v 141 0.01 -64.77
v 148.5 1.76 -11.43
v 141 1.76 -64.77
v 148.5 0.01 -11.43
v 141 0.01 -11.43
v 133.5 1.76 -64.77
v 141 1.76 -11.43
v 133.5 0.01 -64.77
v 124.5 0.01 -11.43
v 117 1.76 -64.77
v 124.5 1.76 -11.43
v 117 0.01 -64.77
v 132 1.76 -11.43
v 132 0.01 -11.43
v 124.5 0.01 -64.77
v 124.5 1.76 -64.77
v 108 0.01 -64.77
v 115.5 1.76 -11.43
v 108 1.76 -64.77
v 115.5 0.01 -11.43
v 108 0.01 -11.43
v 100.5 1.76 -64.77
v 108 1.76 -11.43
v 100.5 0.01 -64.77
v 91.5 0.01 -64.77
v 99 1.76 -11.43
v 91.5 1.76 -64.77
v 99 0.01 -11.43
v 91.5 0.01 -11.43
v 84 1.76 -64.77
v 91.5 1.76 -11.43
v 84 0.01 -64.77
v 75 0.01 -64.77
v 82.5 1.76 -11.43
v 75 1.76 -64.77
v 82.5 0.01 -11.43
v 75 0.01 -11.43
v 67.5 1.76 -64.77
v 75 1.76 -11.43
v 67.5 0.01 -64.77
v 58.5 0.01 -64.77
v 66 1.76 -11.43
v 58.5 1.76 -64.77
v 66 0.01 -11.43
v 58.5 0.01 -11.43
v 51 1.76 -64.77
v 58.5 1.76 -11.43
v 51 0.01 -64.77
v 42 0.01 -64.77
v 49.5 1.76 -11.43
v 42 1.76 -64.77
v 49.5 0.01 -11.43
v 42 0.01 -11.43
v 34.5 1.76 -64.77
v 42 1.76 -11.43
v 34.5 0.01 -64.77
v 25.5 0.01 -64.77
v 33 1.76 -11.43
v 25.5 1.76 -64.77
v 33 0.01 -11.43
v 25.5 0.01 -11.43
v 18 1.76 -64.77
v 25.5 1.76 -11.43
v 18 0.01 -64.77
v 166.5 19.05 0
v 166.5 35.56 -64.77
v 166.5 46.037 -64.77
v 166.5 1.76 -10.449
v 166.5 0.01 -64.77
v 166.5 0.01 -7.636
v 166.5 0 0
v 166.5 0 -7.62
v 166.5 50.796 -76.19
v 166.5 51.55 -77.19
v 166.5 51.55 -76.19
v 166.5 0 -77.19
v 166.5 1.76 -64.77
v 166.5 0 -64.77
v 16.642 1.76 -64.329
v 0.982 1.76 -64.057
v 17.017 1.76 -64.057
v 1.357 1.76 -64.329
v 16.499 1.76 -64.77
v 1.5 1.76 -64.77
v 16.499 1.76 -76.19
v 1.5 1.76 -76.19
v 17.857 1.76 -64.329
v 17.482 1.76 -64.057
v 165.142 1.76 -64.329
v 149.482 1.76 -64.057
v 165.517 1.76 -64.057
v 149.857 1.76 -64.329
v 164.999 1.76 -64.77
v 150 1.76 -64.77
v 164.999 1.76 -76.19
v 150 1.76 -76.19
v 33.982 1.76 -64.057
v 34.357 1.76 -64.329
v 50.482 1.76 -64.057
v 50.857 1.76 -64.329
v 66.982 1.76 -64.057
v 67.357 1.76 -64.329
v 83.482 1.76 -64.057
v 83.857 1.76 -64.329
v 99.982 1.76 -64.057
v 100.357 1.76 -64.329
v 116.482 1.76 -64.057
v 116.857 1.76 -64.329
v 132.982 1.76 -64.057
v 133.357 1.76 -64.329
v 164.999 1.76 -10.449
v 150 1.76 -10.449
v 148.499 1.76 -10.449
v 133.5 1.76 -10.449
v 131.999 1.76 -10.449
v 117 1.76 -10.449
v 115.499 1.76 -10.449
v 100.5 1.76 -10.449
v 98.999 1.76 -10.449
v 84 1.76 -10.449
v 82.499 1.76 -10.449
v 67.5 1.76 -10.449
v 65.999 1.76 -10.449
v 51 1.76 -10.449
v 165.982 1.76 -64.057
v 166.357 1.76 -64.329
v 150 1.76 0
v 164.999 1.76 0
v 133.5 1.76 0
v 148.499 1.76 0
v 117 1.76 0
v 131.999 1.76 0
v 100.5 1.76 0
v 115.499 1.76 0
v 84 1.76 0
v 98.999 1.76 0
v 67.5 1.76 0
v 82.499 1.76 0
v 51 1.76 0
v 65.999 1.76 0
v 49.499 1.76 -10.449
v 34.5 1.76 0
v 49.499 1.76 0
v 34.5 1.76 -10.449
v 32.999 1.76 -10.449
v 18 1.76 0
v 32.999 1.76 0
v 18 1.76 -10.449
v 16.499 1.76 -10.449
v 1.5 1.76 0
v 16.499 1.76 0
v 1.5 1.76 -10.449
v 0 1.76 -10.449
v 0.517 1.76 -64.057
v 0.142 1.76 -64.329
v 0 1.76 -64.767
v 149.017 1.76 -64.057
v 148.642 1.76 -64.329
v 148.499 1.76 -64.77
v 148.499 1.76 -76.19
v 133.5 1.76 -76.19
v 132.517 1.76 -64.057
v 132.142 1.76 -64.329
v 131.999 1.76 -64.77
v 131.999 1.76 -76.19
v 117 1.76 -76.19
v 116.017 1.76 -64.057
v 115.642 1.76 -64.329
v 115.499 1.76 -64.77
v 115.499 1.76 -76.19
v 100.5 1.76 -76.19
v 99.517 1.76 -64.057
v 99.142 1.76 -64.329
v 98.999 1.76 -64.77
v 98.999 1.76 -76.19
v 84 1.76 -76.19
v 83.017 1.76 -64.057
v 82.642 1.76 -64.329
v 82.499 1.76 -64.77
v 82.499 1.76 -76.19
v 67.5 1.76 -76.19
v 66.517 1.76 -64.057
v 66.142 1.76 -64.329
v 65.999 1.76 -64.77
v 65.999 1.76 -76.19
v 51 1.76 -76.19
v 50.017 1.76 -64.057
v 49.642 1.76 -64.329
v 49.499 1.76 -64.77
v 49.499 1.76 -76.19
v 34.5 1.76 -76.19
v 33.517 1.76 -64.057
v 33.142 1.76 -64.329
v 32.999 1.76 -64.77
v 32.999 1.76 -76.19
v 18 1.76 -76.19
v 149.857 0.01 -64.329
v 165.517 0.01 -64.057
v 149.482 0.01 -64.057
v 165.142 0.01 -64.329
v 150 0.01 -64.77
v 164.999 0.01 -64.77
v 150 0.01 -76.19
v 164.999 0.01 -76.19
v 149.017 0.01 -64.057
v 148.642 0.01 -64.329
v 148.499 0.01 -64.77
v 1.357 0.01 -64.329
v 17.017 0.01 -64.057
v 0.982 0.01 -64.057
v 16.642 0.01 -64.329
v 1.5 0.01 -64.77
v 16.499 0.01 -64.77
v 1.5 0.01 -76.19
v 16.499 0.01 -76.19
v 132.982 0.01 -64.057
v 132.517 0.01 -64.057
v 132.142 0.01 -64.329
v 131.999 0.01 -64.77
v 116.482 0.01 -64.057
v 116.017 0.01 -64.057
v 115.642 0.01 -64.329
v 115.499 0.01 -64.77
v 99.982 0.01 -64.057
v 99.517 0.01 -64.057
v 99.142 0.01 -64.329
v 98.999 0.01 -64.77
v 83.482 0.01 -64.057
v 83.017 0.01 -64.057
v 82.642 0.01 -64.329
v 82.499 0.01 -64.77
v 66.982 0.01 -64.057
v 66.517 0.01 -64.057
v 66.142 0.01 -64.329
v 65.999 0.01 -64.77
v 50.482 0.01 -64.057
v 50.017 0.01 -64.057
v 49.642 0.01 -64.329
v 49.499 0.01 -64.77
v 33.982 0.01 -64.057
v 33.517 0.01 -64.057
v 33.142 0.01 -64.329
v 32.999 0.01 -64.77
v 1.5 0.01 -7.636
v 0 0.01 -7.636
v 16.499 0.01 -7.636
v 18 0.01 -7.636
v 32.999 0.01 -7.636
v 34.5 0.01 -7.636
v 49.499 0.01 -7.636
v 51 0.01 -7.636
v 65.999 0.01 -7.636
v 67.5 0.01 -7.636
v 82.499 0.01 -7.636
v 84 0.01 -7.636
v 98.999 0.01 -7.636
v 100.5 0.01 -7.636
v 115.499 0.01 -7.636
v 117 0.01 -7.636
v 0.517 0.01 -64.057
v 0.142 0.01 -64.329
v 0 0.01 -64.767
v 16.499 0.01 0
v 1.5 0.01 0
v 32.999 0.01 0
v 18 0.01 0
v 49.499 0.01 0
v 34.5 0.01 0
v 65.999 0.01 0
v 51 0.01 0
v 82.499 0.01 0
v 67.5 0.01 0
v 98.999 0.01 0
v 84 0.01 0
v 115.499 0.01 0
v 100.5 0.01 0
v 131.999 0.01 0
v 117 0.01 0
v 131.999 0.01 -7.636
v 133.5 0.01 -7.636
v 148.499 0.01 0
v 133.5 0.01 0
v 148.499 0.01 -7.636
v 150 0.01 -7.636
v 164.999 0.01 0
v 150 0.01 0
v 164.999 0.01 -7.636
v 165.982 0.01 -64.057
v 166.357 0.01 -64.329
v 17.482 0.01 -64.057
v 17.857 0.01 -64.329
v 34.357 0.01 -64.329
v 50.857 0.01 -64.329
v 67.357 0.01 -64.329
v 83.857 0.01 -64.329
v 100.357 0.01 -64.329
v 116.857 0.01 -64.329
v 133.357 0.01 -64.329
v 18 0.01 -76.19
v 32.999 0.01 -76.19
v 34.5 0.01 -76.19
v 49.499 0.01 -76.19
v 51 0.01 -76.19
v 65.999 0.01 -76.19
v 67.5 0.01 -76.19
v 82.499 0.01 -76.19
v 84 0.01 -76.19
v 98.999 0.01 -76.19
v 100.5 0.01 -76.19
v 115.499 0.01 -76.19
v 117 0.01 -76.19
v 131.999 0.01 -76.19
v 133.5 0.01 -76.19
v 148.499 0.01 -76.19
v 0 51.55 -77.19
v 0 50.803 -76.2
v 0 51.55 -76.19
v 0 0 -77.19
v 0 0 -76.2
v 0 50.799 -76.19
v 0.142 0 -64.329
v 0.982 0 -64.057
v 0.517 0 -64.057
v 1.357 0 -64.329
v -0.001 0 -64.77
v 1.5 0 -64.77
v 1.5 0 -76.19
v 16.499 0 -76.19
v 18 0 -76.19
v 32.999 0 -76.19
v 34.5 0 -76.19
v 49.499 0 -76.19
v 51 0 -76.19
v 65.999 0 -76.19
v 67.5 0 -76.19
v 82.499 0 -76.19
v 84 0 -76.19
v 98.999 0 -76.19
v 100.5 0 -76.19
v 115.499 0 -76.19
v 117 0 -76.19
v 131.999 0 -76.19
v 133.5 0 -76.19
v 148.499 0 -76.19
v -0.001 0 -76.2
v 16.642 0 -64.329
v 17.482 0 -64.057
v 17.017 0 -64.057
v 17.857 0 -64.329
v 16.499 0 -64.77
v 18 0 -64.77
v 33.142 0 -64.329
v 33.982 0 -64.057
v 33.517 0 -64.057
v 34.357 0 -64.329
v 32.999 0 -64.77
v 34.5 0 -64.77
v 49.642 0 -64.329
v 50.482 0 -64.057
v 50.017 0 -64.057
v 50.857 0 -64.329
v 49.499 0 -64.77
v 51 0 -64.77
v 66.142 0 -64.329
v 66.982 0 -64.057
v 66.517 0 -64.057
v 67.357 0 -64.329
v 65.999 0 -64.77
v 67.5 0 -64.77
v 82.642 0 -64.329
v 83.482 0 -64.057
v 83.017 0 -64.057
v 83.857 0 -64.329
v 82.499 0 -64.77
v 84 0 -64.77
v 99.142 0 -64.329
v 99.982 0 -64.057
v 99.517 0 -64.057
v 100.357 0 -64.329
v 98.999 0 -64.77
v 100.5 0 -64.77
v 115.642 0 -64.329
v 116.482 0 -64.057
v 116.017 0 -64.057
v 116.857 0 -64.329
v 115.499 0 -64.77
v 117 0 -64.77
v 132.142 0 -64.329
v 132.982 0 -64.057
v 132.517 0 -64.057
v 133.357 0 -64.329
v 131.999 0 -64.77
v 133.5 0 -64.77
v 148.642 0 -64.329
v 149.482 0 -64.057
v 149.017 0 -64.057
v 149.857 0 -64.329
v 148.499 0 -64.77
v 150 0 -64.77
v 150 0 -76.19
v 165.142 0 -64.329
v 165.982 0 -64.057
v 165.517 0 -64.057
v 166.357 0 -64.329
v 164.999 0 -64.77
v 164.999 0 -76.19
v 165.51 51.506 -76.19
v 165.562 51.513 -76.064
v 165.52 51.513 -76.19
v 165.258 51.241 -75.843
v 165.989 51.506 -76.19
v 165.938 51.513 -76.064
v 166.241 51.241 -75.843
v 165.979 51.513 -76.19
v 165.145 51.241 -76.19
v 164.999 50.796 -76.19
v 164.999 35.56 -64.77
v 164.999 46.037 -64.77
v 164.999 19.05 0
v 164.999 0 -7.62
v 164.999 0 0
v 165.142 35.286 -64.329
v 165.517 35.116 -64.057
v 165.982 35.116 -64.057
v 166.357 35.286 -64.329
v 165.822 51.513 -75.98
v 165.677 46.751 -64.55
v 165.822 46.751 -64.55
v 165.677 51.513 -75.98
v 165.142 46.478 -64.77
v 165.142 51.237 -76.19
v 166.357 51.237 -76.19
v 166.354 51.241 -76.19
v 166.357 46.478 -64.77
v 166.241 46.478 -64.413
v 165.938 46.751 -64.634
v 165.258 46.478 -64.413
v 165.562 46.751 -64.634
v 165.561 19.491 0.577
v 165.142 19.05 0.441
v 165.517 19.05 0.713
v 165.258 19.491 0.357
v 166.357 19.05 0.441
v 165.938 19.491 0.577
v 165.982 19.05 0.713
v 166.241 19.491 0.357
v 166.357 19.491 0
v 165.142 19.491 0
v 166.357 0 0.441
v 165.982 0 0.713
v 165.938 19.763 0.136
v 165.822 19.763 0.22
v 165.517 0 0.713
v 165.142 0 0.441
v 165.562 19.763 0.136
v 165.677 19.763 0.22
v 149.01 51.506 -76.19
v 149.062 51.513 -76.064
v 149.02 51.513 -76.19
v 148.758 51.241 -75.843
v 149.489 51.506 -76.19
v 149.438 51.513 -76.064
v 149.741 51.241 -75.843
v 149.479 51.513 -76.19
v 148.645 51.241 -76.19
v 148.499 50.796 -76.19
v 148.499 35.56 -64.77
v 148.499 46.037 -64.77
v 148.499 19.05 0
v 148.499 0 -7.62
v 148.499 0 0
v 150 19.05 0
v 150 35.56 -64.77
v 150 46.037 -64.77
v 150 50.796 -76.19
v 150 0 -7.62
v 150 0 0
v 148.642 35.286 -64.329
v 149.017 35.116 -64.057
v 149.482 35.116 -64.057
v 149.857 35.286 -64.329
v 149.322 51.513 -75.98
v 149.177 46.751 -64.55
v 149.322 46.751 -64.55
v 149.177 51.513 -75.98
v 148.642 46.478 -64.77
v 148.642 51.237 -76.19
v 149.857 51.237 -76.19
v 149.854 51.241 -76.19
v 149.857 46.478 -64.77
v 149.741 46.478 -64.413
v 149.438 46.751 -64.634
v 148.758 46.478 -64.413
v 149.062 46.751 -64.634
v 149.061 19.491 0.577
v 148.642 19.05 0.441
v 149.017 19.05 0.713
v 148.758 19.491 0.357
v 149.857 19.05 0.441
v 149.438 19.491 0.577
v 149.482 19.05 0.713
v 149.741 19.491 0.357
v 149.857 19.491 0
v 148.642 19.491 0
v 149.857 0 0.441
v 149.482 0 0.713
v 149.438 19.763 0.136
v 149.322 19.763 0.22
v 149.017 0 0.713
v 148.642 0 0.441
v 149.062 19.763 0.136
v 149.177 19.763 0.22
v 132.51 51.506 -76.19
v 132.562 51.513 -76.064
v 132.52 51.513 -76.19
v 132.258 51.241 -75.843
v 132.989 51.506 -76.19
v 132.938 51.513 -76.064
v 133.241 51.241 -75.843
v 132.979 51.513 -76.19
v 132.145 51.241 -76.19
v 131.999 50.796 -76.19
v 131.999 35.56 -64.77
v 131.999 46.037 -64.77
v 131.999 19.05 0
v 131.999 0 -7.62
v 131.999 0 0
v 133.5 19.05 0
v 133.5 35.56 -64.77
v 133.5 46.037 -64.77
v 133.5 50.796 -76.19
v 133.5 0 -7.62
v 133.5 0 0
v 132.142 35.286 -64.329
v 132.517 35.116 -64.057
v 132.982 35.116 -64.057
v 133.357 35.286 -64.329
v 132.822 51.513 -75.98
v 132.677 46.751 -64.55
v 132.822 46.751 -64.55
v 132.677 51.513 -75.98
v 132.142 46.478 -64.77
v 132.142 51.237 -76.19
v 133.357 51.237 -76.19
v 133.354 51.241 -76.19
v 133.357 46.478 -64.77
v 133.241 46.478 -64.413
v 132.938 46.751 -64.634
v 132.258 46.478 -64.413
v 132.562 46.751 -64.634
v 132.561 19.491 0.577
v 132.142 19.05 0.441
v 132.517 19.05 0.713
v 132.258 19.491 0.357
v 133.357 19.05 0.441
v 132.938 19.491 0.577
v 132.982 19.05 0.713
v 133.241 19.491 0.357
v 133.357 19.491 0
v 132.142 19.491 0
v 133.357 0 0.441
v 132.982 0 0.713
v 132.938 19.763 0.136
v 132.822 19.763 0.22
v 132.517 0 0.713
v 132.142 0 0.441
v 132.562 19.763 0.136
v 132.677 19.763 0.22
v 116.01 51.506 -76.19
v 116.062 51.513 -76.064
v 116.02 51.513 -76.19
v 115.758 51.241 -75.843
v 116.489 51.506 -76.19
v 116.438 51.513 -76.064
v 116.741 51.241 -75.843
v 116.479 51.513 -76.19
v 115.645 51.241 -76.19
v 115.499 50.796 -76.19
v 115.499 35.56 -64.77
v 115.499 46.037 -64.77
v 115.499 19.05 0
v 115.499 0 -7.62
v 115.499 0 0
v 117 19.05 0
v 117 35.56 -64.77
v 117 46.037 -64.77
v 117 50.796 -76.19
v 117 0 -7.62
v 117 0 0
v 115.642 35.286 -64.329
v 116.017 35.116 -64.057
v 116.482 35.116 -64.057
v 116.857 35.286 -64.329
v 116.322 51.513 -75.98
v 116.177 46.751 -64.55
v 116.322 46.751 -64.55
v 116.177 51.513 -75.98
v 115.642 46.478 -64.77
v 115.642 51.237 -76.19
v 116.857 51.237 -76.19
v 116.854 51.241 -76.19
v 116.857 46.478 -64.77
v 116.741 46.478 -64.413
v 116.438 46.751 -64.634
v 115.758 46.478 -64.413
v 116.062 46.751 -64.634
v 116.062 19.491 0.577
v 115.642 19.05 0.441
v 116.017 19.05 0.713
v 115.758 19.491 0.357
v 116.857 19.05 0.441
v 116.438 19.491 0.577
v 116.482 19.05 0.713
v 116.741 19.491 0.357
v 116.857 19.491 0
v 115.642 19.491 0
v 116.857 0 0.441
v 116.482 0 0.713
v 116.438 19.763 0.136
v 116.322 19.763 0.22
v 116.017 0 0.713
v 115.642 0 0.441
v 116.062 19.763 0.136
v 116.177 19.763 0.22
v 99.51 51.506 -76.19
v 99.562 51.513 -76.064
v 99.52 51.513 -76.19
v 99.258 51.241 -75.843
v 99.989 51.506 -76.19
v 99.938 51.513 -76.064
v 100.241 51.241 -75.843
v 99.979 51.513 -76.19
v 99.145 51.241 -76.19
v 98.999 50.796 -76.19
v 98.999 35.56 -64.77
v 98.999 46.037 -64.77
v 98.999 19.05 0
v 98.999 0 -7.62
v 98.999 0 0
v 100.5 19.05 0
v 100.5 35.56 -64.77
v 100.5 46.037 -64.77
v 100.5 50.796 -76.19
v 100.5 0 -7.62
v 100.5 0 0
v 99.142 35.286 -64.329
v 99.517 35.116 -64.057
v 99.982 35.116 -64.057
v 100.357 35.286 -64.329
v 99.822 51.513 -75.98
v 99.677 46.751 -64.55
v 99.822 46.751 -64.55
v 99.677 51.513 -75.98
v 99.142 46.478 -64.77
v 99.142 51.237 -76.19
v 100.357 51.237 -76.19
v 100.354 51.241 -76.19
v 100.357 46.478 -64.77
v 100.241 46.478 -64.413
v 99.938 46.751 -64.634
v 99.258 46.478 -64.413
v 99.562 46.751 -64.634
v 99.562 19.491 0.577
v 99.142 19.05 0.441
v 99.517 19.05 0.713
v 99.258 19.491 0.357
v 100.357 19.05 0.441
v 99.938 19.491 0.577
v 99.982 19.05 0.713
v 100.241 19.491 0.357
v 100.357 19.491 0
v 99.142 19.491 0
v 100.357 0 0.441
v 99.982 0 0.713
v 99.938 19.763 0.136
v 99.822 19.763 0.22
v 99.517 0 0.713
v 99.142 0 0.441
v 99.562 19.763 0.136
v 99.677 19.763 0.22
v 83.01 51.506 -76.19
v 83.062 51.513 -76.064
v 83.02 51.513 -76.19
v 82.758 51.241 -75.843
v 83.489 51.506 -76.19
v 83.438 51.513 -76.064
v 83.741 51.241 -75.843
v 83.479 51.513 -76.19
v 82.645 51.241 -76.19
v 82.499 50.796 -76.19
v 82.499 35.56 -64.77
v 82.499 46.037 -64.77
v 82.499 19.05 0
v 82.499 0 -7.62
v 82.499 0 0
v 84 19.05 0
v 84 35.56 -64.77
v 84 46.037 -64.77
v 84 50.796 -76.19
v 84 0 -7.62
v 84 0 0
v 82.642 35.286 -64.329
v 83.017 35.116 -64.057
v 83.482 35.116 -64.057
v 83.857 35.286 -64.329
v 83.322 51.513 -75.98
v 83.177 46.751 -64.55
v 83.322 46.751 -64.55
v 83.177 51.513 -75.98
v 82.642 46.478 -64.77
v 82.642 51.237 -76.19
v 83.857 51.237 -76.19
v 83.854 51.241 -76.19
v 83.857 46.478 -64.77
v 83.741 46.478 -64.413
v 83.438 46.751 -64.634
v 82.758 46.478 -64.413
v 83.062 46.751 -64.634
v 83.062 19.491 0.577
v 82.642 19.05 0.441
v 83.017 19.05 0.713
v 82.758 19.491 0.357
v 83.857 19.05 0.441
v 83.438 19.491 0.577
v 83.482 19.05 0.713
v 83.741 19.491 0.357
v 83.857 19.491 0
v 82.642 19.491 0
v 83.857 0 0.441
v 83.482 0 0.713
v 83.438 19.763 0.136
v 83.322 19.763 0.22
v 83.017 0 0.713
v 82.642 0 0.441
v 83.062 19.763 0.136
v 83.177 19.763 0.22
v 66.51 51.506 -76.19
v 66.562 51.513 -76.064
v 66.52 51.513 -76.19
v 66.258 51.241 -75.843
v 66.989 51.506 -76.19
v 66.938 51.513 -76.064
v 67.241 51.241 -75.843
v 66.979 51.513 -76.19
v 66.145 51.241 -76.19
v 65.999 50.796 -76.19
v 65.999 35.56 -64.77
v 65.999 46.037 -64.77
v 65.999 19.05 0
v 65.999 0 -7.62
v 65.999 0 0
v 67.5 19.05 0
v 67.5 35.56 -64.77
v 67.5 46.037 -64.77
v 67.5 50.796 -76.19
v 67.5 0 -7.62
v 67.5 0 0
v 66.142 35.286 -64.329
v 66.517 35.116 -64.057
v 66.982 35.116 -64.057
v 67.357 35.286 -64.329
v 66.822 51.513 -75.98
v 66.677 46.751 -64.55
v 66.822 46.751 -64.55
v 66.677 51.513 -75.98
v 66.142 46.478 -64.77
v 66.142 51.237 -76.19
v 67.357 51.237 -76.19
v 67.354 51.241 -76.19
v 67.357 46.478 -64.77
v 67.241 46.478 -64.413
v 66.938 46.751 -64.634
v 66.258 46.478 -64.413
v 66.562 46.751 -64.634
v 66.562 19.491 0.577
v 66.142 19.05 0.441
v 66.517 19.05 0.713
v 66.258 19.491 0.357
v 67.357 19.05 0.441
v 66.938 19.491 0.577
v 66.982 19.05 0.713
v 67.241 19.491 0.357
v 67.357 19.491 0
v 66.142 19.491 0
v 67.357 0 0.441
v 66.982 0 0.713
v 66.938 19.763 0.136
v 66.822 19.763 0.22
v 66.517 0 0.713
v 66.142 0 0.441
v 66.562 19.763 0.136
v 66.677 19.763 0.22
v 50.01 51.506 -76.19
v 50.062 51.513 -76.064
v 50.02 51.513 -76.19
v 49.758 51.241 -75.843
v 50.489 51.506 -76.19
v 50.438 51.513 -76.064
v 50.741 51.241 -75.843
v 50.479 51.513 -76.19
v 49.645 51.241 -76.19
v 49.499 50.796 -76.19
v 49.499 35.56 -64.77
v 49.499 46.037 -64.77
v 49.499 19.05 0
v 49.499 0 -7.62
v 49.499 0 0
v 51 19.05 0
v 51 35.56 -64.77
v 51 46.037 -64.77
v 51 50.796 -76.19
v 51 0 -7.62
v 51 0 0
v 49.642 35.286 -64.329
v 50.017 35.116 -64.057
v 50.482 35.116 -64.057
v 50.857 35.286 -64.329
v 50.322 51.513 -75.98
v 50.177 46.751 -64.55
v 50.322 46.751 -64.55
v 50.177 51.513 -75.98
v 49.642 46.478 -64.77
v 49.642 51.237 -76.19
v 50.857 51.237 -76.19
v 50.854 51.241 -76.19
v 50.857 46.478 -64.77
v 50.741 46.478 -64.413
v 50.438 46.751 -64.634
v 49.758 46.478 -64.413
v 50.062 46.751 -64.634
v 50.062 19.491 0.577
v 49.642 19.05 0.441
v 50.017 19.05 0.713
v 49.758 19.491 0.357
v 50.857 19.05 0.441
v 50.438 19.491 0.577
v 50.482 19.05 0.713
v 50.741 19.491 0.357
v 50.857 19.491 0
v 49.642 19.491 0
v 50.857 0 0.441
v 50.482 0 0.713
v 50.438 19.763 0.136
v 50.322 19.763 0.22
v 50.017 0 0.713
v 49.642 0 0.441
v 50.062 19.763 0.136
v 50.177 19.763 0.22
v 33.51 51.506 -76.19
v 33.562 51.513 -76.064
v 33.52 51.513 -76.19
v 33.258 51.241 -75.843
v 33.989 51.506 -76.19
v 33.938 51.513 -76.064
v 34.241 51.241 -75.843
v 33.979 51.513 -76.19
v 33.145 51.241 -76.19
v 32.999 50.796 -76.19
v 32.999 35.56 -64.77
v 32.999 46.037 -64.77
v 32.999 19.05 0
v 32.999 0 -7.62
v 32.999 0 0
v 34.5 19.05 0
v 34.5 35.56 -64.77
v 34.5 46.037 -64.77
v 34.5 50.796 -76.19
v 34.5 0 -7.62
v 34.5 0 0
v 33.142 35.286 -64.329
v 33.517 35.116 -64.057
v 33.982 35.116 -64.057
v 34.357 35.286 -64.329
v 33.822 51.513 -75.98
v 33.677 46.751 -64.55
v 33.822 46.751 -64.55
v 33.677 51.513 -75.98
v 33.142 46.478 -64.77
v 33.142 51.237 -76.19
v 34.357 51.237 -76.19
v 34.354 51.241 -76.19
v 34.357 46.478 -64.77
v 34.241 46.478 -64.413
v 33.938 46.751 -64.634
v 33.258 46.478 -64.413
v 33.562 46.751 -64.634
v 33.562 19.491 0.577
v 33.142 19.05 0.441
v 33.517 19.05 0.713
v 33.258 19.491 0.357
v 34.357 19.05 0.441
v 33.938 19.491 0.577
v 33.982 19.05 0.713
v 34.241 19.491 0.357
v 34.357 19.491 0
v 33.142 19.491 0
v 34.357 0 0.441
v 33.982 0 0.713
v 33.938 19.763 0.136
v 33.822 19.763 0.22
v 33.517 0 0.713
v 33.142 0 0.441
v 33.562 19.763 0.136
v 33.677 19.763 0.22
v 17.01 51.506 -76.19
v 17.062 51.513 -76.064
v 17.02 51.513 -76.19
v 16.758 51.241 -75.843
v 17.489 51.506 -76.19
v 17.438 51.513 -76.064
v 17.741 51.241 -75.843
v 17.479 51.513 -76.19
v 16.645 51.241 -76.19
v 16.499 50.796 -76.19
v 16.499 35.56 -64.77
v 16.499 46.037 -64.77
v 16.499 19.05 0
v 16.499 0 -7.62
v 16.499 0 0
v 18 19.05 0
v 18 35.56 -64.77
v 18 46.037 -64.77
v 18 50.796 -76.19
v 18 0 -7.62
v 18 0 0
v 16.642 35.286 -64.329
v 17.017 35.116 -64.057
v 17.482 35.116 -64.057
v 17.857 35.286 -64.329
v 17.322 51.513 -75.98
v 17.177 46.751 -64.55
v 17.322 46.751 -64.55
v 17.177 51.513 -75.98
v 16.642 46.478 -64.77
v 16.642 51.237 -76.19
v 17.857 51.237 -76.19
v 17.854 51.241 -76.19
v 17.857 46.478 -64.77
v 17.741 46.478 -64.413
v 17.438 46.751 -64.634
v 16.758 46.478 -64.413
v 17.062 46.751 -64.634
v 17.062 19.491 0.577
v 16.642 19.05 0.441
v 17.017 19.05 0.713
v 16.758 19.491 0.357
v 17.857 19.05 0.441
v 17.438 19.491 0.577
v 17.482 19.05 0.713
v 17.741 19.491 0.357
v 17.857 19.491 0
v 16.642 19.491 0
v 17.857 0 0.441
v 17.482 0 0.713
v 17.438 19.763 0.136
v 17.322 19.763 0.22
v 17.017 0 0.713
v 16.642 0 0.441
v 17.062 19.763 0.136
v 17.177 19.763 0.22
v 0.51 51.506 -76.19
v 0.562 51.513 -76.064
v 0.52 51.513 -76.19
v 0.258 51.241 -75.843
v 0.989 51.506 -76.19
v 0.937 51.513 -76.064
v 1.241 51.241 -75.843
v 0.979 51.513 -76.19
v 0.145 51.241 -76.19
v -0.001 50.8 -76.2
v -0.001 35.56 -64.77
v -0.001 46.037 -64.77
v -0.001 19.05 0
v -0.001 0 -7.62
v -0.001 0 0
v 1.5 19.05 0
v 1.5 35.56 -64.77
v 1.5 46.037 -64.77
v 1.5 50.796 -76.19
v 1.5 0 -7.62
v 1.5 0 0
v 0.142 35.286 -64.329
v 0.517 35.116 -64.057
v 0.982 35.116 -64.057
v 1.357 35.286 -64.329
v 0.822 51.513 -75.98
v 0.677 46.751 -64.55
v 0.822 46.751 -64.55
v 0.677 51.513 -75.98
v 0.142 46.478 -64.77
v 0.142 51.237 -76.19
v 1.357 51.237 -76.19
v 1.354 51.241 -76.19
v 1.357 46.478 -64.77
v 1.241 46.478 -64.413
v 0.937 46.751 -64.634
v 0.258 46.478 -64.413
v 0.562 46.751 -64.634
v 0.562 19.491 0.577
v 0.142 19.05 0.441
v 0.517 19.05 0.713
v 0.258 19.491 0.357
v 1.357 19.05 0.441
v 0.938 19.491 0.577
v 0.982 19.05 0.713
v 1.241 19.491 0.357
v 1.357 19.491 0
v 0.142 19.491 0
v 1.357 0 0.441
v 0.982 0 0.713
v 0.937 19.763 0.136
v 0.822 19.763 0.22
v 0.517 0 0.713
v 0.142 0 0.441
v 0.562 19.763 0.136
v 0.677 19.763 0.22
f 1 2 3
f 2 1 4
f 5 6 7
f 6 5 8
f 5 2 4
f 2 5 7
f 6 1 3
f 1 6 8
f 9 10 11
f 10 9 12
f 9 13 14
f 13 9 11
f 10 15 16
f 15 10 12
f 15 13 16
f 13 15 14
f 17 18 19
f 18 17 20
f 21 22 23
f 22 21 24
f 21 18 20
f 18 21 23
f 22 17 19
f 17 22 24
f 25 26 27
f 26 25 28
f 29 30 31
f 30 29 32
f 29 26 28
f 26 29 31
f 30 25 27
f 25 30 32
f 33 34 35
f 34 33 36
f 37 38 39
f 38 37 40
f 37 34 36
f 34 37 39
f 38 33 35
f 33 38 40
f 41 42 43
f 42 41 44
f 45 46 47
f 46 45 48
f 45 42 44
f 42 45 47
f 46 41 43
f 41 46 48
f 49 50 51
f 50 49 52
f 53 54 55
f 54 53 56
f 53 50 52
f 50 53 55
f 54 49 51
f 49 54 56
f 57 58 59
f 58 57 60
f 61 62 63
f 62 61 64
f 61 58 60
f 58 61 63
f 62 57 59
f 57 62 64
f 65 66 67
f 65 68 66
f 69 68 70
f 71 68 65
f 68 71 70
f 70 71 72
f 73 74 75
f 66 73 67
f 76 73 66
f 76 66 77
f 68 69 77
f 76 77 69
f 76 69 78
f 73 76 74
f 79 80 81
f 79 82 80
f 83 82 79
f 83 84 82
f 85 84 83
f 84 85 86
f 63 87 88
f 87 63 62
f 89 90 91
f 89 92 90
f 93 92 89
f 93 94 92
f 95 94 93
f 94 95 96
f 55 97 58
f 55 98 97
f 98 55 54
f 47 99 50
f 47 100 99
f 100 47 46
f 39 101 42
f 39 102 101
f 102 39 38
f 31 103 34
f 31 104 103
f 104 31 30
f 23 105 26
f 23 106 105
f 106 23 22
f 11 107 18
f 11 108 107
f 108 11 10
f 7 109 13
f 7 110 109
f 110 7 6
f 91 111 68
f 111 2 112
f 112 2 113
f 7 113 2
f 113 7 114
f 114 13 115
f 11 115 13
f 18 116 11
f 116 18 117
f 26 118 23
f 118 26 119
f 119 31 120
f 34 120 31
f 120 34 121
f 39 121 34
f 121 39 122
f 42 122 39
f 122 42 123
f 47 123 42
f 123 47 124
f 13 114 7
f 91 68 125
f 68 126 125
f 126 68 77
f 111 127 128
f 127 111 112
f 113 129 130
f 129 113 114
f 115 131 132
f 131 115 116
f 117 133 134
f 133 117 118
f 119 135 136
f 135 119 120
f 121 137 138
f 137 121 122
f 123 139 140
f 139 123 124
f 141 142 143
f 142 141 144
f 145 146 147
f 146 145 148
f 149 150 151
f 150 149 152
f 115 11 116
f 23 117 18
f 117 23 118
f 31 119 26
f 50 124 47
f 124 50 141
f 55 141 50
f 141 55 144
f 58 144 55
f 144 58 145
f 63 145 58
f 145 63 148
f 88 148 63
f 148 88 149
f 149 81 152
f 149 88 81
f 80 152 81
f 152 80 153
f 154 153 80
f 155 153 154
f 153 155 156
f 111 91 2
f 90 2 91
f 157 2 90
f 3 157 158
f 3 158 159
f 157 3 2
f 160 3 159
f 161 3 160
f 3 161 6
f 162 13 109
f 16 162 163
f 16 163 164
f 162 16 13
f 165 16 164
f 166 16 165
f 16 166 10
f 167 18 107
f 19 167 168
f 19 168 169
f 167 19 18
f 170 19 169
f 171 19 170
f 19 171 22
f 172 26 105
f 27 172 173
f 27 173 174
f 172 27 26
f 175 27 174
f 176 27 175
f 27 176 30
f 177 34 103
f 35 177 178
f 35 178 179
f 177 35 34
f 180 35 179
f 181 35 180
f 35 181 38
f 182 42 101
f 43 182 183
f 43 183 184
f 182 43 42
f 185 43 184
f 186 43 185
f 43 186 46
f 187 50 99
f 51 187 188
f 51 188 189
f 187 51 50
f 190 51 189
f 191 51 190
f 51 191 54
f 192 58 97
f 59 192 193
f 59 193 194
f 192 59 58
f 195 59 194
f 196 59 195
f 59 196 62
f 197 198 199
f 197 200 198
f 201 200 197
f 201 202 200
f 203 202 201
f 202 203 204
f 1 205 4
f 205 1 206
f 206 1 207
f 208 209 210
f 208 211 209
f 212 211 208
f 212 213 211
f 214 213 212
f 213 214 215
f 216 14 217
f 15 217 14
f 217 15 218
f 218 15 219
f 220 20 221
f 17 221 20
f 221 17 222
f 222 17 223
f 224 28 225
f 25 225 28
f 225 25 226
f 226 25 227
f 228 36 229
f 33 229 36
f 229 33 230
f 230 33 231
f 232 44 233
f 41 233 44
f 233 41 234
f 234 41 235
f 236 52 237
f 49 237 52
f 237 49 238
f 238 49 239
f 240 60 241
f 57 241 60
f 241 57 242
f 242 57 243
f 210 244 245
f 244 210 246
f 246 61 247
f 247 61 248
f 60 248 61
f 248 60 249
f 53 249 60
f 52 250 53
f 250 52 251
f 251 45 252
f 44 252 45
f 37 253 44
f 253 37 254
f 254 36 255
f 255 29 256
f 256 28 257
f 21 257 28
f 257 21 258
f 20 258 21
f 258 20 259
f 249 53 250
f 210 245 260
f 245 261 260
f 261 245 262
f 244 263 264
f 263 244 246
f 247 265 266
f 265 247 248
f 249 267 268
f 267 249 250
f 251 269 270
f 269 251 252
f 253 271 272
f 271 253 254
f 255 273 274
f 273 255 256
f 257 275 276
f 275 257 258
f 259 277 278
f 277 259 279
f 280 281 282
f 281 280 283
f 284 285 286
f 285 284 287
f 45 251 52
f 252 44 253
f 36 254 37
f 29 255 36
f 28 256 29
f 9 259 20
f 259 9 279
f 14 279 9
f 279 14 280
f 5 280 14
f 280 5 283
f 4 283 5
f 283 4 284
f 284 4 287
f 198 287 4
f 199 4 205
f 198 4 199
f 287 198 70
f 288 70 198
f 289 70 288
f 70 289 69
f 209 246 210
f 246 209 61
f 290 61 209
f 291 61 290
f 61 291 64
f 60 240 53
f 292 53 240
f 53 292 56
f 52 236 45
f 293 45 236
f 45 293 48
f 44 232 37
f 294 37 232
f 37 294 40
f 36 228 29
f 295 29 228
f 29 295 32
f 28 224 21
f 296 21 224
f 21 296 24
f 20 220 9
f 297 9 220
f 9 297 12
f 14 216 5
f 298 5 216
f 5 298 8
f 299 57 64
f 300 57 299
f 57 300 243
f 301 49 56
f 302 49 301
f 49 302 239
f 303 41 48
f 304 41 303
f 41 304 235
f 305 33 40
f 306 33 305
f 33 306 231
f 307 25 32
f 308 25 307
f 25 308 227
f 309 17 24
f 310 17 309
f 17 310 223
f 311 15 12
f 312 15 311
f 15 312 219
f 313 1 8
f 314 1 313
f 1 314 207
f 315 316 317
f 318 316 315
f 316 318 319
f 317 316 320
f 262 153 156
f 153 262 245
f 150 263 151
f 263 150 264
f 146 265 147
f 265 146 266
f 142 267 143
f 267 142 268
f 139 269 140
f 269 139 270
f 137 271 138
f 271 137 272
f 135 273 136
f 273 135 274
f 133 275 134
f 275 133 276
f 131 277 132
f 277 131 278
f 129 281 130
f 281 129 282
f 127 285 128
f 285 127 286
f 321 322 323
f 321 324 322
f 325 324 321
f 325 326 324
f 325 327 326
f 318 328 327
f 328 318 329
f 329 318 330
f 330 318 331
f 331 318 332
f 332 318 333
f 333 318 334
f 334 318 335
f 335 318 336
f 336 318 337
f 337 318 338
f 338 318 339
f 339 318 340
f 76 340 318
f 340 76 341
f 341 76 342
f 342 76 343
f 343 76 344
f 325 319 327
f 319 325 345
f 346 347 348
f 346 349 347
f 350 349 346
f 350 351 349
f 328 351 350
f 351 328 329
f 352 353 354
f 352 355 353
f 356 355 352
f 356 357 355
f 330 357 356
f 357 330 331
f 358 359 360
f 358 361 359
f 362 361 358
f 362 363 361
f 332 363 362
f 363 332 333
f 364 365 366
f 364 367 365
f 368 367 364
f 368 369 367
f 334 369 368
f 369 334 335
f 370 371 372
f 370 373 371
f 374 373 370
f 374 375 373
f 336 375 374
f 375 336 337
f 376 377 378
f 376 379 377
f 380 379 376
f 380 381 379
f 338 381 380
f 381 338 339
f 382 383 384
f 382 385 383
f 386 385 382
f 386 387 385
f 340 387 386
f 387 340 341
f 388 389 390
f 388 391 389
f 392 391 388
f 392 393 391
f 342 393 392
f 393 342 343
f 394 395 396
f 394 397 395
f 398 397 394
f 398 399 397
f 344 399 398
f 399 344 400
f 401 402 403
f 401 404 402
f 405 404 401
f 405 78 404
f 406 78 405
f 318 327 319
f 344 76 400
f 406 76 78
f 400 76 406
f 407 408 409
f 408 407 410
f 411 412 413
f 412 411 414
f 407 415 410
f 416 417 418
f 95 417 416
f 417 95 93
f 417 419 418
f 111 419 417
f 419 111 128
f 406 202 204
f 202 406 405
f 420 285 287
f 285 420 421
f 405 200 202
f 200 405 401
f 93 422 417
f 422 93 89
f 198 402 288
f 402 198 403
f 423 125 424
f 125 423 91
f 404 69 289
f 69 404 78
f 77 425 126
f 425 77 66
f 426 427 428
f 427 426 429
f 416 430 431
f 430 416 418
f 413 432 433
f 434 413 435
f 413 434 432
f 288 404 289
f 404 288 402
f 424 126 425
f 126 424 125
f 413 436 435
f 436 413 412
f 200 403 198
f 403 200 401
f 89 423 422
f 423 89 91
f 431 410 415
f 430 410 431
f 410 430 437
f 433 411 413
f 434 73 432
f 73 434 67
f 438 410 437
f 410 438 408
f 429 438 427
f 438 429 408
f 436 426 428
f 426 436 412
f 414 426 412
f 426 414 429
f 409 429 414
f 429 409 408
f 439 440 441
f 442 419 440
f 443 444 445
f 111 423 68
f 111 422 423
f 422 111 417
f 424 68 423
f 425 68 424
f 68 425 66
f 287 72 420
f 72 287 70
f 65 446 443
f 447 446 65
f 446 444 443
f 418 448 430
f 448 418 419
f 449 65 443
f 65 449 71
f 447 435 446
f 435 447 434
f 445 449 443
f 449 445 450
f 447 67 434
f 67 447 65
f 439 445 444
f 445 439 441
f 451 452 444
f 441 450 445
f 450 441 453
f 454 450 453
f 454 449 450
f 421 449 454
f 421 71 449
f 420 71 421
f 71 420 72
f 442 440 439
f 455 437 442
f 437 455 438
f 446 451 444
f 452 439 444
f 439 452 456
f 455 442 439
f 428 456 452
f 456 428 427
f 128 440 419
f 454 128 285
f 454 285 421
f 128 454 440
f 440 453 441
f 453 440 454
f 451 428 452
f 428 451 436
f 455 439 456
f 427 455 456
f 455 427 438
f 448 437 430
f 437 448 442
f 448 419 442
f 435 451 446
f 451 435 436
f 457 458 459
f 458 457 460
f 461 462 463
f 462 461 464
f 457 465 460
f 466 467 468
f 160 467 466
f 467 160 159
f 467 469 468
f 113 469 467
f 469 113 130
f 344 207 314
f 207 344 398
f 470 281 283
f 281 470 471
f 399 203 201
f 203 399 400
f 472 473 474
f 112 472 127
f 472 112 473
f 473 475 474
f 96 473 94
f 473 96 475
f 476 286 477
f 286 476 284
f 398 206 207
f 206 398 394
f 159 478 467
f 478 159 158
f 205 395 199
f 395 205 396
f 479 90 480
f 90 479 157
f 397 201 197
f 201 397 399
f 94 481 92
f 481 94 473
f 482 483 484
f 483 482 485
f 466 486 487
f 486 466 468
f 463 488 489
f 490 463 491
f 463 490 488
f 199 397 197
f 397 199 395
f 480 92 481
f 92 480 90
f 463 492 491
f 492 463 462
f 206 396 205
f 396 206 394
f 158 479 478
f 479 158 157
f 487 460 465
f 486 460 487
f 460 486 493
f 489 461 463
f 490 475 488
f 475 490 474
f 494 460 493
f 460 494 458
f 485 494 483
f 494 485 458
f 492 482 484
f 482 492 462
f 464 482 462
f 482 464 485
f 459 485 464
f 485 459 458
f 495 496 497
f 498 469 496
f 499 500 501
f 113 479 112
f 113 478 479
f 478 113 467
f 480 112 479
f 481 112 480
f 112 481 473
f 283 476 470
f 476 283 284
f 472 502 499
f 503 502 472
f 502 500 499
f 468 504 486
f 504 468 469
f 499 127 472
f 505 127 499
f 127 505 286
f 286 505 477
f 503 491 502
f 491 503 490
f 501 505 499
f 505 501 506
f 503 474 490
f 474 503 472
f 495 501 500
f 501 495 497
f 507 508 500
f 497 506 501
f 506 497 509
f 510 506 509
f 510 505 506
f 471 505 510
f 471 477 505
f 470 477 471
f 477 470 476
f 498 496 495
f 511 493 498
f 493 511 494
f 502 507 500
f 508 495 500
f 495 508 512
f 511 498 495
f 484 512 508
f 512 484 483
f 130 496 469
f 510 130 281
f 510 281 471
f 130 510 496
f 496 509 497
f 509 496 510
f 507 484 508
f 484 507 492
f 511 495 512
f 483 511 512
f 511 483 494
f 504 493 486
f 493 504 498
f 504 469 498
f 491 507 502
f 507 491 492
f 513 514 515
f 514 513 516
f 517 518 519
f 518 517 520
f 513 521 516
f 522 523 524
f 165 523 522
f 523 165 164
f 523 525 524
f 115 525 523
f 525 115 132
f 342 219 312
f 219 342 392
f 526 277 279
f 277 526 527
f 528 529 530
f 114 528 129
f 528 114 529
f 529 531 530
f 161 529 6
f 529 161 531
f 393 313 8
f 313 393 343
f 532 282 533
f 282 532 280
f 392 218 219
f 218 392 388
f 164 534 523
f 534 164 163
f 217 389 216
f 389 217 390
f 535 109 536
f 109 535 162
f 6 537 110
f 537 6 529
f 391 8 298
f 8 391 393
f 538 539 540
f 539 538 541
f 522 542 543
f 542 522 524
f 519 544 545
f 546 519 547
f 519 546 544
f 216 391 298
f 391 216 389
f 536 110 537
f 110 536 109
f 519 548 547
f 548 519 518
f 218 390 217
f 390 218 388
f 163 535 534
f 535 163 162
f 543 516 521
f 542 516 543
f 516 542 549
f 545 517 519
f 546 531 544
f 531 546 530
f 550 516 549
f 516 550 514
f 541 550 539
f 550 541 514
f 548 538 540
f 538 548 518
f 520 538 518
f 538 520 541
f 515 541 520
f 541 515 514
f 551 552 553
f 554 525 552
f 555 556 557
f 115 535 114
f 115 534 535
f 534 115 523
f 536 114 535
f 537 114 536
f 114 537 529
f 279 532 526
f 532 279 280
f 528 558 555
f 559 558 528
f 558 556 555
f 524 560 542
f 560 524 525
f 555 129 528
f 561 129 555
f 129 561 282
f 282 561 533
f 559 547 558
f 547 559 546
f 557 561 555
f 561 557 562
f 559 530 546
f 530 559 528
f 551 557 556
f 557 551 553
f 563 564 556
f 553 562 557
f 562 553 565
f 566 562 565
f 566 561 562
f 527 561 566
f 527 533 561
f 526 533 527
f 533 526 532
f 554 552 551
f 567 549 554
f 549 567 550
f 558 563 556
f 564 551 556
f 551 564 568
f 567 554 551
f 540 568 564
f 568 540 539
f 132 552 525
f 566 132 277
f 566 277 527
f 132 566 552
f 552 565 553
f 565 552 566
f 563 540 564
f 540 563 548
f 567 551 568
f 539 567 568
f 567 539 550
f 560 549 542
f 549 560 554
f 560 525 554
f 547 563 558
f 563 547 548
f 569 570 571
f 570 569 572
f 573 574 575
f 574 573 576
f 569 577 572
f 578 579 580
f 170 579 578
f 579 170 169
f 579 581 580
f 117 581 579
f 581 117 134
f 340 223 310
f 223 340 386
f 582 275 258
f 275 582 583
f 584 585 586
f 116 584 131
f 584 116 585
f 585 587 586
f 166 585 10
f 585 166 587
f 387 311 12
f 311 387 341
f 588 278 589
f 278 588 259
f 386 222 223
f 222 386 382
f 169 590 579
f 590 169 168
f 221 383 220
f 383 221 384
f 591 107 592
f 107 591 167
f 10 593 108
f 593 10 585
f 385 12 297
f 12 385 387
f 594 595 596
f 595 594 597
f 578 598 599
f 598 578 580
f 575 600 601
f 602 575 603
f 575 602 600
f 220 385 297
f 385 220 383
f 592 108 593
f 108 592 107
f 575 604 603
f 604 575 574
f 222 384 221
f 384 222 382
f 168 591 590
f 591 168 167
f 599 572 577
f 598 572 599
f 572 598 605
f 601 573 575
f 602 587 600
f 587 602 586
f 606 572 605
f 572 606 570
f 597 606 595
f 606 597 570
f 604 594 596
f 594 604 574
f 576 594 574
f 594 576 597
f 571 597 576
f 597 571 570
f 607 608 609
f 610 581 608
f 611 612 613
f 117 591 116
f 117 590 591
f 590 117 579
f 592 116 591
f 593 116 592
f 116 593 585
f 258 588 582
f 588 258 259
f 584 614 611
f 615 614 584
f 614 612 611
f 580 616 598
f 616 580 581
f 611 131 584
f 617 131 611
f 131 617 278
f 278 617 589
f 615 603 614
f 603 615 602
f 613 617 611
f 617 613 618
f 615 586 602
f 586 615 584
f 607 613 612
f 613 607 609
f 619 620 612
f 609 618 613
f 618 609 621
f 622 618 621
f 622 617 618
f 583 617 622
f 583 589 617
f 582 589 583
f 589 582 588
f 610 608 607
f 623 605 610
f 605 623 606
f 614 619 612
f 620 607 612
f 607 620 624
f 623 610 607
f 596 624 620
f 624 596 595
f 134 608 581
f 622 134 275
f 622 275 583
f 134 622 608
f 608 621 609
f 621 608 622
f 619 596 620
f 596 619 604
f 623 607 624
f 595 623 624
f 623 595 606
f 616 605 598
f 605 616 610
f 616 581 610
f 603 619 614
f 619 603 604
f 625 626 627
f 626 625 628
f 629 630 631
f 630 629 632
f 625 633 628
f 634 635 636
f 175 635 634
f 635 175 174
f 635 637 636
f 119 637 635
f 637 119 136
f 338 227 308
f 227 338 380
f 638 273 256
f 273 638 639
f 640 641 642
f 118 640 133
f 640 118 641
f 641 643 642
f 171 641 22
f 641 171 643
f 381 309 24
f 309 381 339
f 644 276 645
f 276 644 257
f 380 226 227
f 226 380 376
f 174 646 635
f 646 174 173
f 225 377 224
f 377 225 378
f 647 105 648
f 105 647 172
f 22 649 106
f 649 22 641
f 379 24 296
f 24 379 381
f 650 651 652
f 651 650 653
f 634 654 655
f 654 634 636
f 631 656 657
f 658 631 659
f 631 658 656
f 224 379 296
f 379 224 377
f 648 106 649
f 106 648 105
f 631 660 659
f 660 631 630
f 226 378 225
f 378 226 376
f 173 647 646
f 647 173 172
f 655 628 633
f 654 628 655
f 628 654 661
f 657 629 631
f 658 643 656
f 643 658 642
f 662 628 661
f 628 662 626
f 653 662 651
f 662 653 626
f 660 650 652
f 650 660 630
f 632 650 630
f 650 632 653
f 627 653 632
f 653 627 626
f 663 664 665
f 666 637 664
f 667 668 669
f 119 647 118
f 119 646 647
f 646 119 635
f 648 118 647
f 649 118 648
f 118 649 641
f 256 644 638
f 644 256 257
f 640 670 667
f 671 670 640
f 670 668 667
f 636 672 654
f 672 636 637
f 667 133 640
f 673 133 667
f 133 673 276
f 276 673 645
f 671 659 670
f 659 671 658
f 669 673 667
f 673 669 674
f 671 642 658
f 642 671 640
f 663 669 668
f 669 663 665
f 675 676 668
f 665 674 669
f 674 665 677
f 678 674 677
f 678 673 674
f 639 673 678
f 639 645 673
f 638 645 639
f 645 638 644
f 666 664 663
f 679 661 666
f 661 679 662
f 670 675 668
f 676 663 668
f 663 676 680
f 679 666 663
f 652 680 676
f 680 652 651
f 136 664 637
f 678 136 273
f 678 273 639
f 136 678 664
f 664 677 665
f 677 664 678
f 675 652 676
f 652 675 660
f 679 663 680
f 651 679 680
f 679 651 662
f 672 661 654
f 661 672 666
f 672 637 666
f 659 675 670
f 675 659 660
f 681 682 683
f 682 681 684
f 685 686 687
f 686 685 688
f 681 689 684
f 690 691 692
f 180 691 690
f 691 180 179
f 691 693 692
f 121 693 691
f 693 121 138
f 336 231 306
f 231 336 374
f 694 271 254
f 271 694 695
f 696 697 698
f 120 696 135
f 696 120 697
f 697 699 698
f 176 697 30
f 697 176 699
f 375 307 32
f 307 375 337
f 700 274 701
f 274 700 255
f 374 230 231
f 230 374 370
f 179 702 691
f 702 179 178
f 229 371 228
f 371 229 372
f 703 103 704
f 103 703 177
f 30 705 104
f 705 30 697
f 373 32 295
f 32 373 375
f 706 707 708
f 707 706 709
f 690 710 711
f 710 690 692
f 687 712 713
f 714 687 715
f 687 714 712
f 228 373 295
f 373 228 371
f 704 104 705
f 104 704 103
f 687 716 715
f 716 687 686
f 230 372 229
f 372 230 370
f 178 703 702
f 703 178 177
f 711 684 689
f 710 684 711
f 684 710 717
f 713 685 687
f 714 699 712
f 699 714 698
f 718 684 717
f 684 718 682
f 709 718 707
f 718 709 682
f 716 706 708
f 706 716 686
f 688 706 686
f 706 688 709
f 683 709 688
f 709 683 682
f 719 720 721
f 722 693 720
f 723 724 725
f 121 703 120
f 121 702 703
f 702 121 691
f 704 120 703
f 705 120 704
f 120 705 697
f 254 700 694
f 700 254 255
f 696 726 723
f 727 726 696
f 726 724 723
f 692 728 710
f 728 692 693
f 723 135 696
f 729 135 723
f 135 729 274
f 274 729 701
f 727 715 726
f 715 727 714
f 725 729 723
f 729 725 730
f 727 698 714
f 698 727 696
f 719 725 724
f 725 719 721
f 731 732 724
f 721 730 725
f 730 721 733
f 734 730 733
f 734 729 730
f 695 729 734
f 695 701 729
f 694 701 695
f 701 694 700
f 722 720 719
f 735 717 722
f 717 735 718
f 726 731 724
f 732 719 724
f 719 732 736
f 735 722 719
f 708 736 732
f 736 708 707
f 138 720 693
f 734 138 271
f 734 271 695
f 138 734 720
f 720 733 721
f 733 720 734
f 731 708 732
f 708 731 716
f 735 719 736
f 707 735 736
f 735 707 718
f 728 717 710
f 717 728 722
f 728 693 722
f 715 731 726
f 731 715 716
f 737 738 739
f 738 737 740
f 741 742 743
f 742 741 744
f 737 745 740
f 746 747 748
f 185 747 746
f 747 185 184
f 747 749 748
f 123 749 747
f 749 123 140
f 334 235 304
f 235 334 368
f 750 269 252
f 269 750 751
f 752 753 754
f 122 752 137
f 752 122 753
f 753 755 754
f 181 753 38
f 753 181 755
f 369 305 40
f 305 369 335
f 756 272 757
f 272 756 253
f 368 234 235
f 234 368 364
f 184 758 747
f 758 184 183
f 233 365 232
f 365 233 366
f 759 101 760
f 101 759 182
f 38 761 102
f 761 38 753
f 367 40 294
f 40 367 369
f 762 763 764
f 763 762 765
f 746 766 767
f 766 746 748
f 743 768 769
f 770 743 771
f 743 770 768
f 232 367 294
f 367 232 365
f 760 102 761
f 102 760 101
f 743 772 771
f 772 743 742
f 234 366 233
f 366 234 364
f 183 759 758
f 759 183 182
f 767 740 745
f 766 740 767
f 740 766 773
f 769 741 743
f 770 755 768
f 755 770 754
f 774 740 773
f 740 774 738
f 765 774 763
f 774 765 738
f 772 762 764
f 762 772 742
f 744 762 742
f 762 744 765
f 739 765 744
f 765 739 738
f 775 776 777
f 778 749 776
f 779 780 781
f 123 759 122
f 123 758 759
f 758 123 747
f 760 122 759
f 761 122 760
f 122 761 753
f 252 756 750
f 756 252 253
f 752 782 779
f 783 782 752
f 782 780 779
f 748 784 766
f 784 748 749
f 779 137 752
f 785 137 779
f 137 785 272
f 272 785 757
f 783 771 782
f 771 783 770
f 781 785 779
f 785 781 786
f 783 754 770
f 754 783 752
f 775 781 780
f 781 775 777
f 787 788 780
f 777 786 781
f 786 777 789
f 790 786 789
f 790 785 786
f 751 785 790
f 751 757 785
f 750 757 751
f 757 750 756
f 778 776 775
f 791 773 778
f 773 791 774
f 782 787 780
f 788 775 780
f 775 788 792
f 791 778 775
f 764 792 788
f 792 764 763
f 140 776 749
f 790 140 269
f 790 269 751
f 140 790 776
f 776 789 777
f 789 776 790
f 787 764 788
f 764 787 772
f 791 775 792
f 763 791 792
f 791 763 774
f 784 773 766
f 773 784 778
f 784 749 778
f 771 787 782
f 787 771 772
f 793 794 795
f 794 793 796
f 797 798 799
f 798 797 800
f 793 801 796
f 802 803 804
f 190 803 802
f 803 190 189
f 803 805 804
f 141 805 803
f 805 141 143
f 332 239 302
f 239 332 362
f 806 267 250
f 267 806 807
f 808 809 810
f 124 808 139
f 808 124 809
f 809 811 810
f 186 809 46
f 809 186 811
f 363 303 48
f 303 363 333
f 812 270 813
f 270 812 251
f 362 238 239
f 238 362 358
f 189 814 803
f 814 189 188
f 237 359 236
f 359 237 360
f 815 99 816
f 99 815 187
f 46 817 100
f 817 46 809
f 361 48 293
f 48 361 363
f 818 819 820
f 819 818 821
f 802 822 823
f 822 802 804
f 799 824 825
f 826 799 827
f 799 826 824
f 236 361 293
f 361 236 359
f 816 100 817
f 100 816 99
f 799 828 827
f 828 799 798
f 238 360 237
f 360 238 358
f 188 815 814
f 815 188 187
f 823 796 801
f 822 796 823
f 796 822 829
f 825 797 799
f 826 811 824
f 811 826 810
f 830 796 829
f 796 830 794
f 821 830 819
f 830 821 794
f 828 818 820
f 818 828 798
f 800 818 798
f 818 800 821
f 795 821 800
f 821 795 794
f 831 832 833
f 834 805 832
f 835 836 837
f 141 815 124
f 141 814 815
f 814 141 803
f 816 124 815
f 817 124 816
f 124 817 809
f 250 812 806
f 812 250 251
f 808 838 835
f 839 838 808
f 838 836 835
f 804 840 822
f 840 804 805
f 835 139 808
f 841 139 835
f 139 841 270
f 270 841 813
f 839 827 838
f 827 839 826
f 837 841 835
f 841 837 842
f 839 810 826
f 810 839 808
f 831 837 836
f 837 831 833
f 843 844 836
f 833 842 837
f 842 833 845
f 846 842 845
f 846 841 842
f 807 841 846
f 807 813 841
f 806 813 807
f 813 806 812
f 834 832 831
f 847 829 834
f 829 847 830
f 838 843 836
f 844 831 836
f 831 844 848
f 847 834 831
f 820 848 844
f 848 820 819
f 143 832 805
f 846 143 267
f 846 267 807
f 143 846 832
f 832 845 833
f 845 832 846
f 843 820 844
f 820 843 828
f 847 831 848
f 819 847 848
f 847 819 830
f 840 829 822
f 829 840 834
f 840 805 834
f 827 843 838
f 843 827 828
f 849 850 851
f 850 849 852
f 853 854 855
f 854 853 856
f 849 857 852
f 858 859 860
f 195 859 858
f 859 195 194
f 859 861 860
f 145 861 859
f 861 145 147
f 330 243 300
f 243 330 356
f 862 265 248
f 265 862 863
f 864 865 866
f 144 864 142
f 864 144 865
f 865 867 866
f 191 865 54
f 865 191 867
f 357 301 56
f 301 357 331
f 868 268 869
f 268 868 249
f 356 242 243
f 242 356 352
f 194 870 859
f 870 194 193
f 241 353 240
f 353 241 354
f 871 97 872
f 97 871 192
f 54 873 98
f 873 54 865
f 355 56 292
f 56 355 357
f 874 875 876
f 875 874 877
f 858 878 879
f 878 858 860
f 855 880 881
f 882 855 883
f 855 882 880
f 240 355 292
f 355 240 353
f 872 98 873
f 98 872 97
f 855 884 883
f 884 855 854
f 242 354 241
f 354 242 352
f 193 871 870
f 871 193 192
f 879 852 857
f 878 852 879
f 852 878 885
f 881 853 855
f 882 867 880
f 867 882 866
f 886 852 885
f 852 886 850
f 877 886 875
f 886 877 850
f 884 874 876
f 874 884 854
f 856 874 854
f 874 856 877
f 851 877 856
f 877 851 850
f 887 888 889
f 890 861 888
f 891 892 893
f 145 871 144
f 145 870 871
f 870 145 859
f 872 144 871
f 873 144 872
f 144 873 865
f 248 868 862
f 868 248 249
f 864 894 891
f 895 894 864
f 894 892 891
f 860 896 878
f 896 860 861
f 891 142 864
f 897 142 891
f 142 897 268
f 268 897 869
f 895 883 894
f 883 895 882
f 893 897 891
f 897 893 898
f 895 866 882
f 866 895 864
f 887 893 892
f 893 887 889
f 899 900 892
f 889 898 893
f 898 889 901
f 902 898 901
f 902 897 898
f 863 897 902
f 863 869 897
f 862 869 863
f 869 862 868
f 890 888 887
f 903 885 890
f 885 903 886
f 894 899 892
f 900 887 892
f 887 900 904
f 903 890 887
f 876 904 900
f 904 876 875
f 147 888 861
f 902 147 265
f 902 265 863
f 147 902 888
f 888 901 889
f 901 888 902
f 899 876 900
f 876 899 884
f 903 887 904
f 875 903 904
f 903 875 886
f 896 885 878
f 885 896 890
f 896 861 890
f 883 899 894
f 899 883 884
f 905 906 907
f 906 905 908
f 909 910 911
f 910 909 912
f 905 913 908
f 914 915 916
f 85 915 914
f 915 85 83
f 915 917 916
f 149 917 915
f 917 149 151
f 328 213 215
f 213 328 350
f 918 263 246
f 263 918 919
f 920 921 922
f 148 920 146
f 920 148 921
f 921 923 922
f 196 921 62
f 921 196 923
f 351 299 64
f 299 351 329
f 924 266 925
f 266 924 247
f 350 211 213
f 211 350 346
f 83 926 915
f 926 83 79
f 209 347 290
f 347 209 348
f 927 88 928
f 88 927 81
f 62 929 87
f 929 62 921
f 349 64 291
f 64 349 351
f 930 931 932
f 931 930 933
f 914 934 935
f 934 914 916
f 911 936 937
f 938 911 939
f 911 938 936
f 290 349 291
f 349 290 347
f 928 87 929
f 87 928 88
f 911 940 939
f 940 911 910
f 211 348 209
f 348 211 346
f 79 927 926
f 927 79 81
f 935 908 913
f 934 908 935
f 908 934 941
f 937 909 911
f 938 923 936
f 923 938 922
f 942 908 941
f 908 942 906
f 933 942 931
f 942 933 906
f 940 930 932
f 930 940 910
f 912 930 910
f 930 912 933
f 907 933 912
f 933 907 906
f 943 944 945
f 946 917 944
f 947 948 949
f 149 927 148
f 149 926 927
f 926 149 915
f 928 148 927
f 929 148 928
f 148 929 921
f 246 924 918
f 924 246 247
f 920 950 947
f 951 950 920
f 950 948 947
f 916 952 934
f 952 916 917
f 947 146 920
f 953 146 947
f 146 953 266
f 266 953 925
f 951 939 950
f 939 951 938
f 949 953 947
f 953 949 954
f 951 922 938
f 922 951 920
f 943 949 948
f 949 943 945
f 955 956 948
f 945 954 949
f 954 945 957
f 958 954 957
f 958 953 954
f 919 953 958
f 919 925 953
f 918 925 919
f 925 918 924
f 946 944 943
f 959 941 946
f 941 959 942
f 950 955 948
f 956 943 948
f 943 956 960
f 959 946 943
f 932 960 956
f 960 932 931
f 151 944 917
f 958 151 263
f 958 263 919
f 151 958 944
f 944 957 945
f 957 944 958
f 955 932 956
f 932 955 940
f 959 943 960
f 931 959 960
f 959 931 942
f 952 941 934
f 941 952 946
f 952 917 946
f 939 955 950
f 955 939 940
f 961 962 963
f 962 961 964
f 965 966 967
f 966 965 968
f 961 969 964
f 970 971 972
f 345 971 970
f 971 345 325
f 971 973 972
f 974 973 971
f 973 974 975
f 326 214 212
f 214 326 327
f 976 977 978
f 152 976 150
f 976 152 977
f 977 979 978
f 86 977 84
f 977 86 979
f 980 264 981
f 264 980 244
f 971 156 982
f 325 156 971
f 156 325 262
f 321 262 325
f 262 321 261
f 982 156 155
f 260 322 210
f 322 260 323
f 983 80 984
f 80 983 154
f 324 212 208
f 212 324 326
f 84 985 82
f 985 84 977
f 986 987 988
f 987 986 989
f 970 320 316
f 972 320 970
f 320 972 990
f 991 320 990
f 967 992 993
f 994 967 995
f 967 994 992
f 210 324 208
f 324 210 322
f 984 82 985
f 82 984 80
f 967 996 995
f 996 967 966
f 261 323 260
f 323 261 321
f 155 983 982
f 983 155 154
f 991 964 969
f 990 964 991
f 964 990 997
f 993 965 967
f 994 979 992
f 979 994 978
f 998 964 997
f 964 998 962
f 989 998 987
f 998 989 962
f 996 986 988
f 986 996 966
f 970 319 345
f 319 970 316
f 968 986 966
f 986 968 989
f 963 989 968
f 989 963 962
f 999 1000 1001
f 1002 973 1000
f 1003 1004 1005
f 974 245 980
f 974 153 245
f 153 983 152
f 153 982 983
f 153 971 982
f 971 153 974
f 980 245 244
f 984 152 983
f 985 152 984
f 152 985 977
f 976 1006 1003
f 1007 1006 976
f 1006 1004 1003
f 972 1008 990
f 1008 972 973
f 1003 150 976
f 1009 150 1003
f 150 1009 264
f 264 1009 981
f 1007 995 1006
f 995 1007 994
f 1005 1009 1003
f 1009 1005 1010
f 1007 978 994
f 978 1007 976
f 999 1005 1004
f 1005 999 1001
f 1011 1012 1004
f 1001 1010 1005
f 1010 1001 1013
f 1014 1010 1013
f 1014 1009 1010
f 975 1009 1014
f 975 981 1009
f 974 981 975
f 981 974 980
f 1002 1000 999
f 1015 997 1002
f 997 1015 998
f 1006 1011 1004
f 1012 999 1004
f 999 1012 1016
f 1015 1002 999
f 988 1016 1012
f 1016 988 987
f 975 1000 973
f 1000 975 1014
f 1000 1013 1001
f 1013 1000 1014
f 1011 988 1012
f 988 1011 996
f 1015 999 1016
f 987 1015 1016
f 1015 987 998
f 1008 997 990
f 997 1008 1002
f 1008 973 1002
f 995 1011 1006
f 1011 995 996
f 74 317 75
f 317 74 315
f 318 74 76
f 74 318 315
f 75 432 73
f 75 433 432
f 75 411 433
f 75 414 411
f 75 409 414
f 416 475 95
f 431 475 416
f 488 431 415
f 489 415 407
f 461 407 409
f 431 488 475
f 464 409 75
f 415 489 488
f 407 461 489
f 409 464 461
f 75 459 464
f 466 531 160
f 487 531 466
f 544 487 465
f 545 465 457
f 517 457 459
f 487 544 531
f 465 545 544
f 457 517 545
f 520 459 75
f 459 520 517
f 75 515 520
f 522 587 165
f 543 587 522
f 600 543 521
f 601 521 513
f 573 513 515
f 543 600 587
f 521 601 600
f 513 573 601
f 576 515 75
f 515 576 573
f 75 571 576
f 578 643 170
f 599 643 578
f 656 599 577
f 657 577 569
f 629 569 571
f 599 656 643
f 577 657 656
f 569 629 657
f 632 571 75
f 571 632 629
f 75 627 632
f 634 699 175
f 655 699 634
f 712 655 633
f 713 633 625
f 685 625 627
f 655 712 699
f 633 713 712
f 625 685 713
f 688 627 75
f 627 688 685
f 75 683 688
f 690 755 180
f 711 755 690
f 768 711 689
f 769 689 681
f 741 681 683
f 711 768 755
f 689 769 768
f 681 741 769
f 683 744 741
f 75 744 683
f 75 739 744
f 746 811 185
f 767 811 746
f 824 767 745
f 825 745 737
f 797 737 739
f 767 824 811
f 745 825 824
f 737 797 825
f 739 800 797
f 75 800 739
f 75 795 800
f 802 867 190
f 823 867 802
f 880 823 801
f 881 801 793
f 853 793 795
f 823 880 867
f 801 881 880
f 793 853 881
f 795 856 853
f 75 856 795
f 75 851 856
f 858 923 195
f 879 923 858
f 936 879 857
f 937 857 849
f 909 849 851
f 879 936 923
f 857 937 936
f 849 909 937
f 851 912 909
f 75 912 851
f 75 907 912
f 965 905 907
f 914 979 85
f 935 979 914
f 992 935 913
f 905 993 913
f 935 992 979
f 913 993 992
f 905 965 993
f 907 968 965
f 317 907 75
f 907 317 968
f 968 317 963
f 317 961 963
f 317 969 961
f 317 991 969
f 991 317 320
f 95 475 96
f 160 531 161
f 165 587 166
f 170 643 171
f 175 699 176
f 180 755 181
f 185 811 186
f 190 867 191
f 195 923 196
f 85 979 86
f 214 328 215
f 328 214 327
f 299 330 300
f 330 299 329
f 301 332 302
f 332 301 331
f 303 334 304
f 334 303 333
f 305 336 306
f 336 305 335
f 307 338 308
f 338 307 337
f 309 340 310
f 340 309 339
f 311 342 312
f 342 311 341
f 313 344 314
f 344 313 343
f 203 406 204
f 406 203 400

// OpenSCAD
n1=0;
spacing1 = 7;
n2=10;
spacing2 = 15;
n3=0;
spacing3 = 10;
n4=0;
spacing4 = 10;
minimum_width_for_plastic_removal = 10;

inside_thickness = 1.5;
base_thickness = 1.75;
rear_height = 50.8;
front_height = 19.05;
depth = 76.2;
rear_thickness = 1;

module endOfCustomizerData() {}

nudge = 0.01;

counts = [n1,n2,n3,n4];
spacings = [spacing1,spacing2,spacing3,spacing4];

function join(arrays,n) = n>=len(arrays) ? [] : concat(arrays[n], join(arrays,n+1));

dx_rev = join([for(i=[0:1:len(counts)-1]) [for(j=[0:1:counts[i]-1]) spacings[i]]],0);
dx = [for(i=[0:len(dx_rev)-1]) dx_rev[len(dx_rev)-1-i]];

function sum(v,n) = n<0 ? 0 : v[n]+sum(v,n-1);

width = sum(dx,len(dx)-1) + (len(dx)+1)*inside_thickness;
echo("Width",width);

function xpos(n) = sum(dx,n-1) + inside_thickness * n;

module base() {
    render(convexity=10)
    difference() {
        cube([width, depth, base_thickness]);
        for(i=[1:1:len(dx)-2]) {
            if (dx[i] >= minimum_width_for_plastic_removal) {
                x = width-xpos(i)-inside_thickness;
                color("red") translate([0,0,-nudge]) linear_extrude(height=base_thickness+2*nudge)
                polygon(points=[[x,.15*depth],[x-dx[i]/2,.15*depth],[x-dx[i],.85*depth],[x-dx[i]/2,.85*depth]]);
            }
        }
    }
}

module stand() {
translate([0,0,nudge]) base();
    
translate([0,depth-nudge,0])
cube([width, rear_thickness, rear_height+inside_thickness/2]);

for (i=[0:len(dx)]) {
    translate([width-(inside_thickness/2+xpos(i)),0,0])
    minkowski() {
    intersection() {
    sphere(r=inside_thickness/2,$fn=10);
        translate([-inside_thickness/2,-inside_thickness,0]) cube(inside_thickness);
    }
    rotate([0,-90,0])
    linear_extrude(height=0.001)
    difference() {
    polygon(points=[[0,0],[front_height,0],[rear_height,depth],[0,depth]]);
    polygon(points=[[0,0.1*depth],[0.7*rear_height,0.85*depth],[0,0.85*depth]]);
    }
    }
}
}

rotate([-90,0,0]) 
stand();
